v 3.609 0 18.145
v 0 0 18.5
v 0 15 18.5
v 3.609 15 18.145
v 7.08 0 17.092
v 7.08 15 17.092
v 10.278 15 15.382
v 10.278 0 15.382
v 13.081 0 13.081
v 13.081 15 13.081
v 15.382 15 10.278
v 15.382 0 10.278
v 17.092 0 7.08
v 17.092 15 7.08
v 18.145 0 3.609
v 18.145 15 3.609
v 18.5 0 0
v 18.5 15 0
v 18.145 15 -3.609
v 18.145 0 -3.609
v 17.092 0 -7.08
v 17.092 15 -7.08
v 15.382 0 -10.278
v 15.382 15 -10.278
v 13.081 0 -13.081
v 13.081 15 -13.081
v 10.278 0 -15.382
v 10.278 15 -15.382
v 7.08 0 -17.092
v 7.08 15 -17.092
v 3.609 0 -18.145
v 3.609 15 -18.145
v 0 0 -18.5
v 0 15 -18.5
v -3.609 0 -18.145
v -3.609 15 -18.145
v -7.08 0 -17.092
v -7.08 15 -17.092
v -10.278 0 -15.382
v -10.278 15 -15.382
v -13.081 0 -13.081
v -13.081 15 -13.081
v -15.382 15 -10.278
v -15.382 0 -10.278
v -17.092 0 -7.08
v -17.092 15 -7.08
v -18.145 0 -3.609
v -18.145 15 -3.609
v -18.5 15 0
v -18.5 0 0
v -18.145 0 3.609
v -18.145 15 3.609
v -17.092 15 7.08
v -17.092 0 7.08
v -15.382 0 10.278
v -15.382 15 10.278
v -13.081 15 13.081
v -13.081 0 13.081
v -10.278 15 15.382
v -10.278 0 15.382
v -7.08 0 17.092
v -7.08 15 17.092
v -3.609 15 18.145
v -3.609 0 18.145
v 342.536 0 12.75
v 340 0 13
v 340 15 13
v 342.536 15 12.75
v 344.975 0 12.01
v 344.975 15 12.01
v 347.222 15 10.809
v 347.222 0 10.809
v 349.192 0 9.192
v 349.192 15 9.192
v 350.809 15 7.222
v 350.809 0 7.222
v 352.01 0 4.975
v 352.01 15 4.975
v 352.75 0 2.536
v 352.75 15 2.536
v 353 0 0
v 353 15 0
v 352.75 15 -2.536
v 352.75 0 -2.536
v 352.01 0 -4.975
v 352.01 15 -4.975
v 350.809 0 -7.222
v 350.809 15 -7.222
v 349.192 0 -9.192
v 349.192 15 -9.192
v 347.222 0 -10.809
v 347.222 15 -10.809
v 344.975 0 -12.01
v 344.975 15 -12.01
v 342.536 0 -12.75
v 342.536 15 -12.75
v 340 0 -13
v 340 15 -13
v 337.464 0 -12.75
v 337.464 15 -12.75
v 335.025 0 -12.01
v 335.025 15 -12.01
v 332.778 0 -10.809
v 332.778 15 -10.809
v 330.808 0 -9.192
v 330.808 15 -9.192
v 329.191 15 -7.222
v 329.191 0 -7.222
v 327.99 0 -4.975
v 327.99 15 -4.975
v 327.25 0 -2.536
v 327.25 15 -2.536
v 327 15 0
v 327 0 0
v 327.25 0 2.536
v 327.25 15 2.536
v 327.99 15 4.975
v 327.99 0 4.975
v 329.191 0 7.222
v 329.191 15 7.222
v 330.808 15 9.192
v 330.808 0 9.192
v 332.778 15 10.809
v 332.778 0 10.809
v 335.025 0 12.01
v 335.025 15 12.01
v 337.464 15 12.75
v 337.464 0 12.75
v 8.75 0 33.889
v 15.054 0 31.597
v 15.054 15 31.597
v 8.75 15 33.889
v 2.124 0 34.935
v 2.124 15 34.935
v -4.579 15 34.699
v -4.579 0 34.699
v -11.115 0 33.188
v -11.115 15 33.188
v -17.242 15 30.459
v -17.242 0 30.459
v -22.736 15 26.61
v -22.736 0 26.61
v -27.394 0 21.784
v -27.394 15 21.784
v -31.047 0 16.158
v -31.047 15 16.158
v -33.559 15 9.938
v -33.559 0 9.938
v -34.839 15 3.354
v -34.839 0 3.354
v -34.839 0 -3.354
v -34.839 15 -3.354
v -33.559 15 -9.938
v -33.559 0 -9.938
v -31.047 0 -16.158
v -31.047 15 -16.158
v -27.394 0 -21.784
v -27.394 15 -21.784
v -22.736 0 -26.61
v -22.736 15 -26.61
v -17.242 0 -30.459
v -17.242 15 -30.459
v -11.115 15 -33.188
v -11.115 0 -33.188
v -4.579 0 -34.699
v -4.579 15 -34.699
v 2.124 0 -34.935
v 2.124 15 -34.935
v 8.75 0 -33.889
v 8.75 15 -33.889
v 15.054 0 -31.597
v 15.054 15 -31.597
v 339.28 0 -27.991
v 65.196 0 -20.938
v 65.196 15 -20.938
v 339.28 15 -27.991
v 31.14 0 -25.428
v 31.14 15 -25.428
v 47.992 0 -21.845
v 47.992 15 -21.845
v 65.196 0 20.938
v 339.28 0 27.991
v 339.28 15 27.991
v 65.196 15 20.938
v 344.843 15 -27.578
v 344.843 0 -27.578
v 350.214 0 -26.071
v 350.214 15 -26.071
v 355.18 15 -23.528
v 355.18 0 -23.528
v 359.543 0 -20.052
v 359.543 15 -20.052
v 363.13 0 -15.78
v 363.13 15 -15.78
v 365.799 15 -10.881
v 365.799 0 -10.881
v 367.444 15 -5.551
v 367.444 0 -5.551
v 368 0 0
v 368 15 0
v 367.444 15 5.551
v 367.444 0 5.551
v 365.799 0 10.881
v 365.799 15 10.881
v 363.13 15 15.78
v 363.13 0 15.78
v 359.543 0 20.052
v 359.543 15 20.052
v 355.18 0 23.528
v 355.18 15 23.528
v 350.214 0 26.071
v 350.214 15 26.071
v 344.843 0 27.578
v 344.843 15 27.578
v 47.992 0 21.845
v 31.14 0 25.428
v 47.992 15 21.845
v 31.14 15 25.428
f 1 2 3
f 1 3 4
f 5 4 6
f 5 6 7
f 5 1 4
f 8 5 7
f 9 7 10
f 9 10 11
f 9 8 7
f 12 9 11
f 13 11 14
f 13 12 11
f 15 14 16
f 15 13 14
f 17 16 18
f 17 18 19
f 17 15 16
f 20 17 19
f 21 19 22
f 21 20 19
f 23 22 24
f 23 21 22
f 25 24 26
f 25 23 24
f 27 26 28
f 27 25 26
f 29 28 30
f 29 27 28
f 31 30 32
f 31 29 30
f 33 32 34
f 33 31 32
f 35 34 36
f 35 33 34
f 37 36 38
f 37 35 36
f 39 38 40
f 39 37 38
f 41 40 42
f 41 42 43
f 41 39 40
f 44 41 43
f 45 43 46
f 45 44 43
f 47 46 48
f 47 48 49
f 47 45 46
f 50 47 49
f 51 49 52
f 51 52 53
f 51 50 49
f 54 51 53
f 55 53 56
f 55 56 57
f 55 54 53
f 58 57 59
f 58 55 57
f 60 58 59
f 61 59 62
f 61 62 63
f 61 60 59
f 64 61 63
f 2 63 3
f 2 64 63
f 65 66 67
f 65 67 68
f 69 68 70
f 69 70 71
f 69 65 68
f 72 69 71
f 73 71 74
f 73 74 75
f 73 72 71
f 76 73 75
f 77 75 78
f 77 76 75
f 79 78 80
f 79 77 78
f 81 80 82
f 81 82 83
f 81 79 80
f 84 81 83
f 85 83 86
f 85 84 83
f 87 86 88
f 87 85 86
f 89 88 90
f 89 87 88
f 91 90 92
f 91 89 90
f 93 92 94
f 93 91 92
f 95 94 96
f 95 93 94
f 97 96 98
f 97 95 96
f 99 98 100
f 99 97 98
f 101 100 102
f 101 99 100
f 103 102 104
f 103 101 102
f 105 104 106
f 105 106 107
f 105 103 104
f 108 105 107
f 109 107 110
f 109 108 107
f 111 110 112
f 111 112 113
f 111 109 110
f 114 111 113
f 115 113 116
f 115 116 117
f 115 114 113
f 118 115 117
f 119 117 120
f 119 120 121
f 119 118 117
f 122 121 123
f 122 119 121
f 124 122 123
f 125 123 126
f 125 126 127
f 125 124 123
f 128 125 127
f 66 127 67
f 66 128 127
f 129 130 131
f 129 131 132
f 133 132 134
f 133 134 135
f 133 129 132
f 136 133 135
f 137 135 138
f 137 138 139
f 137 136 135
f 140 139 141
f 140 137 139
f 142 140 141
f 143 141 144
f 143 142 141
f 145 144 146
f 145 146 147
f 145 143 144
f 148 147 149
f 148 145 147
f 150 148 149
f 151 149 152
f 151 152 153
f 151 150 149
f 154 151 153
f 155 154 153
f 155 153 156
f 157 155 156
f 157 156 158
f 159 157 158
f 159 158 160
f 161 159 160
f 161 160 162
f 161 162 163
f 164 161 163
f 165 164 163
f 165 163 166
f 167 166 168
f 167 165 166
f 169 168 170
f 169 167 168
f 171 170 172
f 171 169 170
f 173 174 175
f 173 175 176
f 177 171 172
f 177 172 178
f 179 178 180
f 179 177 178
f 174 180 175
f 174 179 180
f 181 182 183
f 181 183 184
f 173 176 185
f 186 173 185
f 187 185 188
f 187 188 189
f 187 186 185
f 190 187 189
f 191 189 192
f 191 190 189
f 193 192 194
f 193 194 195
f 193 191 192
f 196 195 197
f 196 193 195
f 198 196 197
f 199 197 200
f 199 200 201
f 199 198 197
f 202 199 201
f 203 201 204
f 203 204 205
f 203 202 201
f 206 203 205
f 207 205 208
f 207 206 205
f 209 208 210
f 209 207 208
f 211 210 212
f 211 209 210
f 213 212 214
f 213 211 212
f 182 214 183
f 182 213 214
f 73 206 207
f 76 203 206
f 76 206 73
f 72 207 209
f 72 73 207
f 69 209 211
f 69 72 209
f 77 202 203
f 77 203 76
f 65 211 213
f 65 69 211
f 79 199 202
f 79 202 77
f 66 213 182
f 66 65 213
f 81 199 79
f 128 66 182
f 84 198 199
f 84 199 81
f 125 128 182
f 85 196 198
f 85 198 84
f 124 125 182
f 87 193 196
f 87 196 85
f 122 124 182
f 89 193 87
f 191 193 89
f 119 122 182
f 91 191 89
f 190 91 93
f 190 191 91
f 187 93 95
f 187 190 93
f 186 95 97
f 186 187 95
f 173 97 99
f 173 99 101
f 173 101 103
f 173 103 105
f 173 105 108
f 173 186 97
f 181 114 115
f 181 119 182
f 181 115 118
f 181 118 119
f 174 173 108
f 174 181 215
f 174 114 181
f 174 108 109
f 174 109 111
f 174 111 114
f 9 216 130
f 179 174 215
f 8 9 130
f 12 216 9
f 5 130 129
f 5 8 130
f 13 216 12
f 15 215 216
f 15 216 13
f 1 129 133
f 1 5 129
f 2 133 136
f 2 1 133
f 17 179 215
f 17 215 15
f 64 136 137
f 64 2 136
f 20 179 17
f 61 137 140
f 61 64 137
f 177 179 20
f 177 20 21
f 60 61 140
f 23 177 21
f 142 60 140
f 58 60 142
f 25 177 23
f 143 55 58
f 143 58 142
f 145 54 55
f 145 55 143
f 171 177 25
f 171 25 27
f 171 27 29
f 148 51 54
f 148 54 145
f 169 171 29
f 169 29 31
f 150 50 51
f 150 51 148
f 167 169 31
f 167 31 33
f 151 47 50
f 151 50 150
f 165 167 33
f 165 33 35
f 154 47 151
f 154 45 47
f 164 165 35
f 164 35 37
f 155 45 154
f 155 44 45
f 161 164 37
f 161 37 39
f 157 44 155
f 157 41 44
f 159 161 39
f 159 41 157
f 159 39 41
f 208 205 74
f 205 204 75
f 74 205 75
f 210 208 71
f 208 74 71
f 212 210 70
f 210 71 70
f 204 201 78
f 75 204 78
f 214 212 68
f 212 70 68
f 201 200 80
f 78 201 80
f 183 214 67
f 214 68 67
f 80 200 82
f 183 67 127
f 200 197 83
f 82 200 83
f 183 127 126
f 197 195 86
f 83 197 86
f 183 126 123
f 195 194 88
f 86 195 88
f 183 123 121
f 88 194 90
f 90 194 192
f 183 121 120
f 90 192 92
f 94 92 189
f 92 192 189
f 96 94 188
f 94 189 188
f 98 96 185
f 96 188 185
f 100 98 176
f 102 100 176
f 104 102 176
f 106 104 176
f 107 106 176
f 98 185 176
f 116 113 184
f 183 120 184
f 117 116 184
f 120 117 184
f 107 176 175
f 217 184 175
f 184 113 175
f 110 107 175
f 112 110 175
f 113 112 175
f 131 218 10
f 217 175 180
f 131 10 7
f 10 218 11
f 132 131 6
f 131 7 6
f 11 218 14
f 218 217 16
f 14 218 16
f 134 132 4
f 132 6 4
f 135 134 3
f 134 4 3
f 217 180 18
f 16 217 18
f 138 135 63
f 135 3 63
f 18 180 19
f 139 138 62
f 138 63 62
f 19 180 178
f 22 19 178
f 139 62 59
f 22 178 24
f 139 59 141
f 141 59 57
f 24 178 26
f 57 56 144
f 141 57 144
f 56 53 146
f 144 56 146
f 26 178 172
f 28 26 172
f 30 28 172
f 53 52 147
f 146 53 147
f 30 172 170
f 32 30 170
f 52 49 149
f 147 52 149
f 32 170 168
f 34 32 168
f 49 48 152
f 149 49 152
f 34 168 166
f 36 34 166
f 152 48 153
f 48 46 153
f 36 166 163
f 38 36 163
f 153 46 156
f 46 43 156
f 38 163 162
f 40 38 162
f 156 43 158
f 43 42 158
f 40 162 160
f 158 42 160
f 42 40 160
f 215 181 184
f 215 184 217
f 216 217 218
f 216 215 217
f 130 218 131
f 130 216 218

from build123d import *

# Parameters (mm, degrees)
SKETCH_1_R      = 18.5
SKETCH_1_R_2    = 13
EXTRUDE_1_DEPTH = 15


with BuildPart() as part:
    # 草图1 → 凸台-拉伸1 (new body)
    with BuildSketch(Plane(origin=(0, 0, 0), x_dir=(1, 0, 0), z_dir=(0, 1, 0))):
        with BuildLine():
            Line((65.196415688, 20.938478113), (339.27978891, 27.990735896))
            ThreePointArc((339.27978891, 27.990735896), (368, 0), (339.27978891, -27.990735896))
            Line((339.27978891, -27.990735896), (65.196415688, -20.938478113))
            ThreePointArc((65.196415688, -20.938478113), (39.495702891, -23.306065445), (15.054107063, -31.597054618))
            ThreePointArc((15.054107063, -31.597054618), (-35, 0), (15.054107063, 31.597054618))
            ThreePointArc((15.054107063, 31.597054618), (39.495702891, 23.306065445), (65.196415688, 20.938478113))
        make_face()
        with Locations(Location((0, 0, 0), (0, 0, 270))):
            Circle(SKETCH_1_R, mode=Mode.SUBTRACT)
        with Locations(Location((340, 0, 0), (0, 0, 270))):
            Circle(SKETCH_1_R_2, mode=Mode.SUBTRACT)
    extrude(amount=EXTRUDE_1_DEPTH)


solid = part.part
